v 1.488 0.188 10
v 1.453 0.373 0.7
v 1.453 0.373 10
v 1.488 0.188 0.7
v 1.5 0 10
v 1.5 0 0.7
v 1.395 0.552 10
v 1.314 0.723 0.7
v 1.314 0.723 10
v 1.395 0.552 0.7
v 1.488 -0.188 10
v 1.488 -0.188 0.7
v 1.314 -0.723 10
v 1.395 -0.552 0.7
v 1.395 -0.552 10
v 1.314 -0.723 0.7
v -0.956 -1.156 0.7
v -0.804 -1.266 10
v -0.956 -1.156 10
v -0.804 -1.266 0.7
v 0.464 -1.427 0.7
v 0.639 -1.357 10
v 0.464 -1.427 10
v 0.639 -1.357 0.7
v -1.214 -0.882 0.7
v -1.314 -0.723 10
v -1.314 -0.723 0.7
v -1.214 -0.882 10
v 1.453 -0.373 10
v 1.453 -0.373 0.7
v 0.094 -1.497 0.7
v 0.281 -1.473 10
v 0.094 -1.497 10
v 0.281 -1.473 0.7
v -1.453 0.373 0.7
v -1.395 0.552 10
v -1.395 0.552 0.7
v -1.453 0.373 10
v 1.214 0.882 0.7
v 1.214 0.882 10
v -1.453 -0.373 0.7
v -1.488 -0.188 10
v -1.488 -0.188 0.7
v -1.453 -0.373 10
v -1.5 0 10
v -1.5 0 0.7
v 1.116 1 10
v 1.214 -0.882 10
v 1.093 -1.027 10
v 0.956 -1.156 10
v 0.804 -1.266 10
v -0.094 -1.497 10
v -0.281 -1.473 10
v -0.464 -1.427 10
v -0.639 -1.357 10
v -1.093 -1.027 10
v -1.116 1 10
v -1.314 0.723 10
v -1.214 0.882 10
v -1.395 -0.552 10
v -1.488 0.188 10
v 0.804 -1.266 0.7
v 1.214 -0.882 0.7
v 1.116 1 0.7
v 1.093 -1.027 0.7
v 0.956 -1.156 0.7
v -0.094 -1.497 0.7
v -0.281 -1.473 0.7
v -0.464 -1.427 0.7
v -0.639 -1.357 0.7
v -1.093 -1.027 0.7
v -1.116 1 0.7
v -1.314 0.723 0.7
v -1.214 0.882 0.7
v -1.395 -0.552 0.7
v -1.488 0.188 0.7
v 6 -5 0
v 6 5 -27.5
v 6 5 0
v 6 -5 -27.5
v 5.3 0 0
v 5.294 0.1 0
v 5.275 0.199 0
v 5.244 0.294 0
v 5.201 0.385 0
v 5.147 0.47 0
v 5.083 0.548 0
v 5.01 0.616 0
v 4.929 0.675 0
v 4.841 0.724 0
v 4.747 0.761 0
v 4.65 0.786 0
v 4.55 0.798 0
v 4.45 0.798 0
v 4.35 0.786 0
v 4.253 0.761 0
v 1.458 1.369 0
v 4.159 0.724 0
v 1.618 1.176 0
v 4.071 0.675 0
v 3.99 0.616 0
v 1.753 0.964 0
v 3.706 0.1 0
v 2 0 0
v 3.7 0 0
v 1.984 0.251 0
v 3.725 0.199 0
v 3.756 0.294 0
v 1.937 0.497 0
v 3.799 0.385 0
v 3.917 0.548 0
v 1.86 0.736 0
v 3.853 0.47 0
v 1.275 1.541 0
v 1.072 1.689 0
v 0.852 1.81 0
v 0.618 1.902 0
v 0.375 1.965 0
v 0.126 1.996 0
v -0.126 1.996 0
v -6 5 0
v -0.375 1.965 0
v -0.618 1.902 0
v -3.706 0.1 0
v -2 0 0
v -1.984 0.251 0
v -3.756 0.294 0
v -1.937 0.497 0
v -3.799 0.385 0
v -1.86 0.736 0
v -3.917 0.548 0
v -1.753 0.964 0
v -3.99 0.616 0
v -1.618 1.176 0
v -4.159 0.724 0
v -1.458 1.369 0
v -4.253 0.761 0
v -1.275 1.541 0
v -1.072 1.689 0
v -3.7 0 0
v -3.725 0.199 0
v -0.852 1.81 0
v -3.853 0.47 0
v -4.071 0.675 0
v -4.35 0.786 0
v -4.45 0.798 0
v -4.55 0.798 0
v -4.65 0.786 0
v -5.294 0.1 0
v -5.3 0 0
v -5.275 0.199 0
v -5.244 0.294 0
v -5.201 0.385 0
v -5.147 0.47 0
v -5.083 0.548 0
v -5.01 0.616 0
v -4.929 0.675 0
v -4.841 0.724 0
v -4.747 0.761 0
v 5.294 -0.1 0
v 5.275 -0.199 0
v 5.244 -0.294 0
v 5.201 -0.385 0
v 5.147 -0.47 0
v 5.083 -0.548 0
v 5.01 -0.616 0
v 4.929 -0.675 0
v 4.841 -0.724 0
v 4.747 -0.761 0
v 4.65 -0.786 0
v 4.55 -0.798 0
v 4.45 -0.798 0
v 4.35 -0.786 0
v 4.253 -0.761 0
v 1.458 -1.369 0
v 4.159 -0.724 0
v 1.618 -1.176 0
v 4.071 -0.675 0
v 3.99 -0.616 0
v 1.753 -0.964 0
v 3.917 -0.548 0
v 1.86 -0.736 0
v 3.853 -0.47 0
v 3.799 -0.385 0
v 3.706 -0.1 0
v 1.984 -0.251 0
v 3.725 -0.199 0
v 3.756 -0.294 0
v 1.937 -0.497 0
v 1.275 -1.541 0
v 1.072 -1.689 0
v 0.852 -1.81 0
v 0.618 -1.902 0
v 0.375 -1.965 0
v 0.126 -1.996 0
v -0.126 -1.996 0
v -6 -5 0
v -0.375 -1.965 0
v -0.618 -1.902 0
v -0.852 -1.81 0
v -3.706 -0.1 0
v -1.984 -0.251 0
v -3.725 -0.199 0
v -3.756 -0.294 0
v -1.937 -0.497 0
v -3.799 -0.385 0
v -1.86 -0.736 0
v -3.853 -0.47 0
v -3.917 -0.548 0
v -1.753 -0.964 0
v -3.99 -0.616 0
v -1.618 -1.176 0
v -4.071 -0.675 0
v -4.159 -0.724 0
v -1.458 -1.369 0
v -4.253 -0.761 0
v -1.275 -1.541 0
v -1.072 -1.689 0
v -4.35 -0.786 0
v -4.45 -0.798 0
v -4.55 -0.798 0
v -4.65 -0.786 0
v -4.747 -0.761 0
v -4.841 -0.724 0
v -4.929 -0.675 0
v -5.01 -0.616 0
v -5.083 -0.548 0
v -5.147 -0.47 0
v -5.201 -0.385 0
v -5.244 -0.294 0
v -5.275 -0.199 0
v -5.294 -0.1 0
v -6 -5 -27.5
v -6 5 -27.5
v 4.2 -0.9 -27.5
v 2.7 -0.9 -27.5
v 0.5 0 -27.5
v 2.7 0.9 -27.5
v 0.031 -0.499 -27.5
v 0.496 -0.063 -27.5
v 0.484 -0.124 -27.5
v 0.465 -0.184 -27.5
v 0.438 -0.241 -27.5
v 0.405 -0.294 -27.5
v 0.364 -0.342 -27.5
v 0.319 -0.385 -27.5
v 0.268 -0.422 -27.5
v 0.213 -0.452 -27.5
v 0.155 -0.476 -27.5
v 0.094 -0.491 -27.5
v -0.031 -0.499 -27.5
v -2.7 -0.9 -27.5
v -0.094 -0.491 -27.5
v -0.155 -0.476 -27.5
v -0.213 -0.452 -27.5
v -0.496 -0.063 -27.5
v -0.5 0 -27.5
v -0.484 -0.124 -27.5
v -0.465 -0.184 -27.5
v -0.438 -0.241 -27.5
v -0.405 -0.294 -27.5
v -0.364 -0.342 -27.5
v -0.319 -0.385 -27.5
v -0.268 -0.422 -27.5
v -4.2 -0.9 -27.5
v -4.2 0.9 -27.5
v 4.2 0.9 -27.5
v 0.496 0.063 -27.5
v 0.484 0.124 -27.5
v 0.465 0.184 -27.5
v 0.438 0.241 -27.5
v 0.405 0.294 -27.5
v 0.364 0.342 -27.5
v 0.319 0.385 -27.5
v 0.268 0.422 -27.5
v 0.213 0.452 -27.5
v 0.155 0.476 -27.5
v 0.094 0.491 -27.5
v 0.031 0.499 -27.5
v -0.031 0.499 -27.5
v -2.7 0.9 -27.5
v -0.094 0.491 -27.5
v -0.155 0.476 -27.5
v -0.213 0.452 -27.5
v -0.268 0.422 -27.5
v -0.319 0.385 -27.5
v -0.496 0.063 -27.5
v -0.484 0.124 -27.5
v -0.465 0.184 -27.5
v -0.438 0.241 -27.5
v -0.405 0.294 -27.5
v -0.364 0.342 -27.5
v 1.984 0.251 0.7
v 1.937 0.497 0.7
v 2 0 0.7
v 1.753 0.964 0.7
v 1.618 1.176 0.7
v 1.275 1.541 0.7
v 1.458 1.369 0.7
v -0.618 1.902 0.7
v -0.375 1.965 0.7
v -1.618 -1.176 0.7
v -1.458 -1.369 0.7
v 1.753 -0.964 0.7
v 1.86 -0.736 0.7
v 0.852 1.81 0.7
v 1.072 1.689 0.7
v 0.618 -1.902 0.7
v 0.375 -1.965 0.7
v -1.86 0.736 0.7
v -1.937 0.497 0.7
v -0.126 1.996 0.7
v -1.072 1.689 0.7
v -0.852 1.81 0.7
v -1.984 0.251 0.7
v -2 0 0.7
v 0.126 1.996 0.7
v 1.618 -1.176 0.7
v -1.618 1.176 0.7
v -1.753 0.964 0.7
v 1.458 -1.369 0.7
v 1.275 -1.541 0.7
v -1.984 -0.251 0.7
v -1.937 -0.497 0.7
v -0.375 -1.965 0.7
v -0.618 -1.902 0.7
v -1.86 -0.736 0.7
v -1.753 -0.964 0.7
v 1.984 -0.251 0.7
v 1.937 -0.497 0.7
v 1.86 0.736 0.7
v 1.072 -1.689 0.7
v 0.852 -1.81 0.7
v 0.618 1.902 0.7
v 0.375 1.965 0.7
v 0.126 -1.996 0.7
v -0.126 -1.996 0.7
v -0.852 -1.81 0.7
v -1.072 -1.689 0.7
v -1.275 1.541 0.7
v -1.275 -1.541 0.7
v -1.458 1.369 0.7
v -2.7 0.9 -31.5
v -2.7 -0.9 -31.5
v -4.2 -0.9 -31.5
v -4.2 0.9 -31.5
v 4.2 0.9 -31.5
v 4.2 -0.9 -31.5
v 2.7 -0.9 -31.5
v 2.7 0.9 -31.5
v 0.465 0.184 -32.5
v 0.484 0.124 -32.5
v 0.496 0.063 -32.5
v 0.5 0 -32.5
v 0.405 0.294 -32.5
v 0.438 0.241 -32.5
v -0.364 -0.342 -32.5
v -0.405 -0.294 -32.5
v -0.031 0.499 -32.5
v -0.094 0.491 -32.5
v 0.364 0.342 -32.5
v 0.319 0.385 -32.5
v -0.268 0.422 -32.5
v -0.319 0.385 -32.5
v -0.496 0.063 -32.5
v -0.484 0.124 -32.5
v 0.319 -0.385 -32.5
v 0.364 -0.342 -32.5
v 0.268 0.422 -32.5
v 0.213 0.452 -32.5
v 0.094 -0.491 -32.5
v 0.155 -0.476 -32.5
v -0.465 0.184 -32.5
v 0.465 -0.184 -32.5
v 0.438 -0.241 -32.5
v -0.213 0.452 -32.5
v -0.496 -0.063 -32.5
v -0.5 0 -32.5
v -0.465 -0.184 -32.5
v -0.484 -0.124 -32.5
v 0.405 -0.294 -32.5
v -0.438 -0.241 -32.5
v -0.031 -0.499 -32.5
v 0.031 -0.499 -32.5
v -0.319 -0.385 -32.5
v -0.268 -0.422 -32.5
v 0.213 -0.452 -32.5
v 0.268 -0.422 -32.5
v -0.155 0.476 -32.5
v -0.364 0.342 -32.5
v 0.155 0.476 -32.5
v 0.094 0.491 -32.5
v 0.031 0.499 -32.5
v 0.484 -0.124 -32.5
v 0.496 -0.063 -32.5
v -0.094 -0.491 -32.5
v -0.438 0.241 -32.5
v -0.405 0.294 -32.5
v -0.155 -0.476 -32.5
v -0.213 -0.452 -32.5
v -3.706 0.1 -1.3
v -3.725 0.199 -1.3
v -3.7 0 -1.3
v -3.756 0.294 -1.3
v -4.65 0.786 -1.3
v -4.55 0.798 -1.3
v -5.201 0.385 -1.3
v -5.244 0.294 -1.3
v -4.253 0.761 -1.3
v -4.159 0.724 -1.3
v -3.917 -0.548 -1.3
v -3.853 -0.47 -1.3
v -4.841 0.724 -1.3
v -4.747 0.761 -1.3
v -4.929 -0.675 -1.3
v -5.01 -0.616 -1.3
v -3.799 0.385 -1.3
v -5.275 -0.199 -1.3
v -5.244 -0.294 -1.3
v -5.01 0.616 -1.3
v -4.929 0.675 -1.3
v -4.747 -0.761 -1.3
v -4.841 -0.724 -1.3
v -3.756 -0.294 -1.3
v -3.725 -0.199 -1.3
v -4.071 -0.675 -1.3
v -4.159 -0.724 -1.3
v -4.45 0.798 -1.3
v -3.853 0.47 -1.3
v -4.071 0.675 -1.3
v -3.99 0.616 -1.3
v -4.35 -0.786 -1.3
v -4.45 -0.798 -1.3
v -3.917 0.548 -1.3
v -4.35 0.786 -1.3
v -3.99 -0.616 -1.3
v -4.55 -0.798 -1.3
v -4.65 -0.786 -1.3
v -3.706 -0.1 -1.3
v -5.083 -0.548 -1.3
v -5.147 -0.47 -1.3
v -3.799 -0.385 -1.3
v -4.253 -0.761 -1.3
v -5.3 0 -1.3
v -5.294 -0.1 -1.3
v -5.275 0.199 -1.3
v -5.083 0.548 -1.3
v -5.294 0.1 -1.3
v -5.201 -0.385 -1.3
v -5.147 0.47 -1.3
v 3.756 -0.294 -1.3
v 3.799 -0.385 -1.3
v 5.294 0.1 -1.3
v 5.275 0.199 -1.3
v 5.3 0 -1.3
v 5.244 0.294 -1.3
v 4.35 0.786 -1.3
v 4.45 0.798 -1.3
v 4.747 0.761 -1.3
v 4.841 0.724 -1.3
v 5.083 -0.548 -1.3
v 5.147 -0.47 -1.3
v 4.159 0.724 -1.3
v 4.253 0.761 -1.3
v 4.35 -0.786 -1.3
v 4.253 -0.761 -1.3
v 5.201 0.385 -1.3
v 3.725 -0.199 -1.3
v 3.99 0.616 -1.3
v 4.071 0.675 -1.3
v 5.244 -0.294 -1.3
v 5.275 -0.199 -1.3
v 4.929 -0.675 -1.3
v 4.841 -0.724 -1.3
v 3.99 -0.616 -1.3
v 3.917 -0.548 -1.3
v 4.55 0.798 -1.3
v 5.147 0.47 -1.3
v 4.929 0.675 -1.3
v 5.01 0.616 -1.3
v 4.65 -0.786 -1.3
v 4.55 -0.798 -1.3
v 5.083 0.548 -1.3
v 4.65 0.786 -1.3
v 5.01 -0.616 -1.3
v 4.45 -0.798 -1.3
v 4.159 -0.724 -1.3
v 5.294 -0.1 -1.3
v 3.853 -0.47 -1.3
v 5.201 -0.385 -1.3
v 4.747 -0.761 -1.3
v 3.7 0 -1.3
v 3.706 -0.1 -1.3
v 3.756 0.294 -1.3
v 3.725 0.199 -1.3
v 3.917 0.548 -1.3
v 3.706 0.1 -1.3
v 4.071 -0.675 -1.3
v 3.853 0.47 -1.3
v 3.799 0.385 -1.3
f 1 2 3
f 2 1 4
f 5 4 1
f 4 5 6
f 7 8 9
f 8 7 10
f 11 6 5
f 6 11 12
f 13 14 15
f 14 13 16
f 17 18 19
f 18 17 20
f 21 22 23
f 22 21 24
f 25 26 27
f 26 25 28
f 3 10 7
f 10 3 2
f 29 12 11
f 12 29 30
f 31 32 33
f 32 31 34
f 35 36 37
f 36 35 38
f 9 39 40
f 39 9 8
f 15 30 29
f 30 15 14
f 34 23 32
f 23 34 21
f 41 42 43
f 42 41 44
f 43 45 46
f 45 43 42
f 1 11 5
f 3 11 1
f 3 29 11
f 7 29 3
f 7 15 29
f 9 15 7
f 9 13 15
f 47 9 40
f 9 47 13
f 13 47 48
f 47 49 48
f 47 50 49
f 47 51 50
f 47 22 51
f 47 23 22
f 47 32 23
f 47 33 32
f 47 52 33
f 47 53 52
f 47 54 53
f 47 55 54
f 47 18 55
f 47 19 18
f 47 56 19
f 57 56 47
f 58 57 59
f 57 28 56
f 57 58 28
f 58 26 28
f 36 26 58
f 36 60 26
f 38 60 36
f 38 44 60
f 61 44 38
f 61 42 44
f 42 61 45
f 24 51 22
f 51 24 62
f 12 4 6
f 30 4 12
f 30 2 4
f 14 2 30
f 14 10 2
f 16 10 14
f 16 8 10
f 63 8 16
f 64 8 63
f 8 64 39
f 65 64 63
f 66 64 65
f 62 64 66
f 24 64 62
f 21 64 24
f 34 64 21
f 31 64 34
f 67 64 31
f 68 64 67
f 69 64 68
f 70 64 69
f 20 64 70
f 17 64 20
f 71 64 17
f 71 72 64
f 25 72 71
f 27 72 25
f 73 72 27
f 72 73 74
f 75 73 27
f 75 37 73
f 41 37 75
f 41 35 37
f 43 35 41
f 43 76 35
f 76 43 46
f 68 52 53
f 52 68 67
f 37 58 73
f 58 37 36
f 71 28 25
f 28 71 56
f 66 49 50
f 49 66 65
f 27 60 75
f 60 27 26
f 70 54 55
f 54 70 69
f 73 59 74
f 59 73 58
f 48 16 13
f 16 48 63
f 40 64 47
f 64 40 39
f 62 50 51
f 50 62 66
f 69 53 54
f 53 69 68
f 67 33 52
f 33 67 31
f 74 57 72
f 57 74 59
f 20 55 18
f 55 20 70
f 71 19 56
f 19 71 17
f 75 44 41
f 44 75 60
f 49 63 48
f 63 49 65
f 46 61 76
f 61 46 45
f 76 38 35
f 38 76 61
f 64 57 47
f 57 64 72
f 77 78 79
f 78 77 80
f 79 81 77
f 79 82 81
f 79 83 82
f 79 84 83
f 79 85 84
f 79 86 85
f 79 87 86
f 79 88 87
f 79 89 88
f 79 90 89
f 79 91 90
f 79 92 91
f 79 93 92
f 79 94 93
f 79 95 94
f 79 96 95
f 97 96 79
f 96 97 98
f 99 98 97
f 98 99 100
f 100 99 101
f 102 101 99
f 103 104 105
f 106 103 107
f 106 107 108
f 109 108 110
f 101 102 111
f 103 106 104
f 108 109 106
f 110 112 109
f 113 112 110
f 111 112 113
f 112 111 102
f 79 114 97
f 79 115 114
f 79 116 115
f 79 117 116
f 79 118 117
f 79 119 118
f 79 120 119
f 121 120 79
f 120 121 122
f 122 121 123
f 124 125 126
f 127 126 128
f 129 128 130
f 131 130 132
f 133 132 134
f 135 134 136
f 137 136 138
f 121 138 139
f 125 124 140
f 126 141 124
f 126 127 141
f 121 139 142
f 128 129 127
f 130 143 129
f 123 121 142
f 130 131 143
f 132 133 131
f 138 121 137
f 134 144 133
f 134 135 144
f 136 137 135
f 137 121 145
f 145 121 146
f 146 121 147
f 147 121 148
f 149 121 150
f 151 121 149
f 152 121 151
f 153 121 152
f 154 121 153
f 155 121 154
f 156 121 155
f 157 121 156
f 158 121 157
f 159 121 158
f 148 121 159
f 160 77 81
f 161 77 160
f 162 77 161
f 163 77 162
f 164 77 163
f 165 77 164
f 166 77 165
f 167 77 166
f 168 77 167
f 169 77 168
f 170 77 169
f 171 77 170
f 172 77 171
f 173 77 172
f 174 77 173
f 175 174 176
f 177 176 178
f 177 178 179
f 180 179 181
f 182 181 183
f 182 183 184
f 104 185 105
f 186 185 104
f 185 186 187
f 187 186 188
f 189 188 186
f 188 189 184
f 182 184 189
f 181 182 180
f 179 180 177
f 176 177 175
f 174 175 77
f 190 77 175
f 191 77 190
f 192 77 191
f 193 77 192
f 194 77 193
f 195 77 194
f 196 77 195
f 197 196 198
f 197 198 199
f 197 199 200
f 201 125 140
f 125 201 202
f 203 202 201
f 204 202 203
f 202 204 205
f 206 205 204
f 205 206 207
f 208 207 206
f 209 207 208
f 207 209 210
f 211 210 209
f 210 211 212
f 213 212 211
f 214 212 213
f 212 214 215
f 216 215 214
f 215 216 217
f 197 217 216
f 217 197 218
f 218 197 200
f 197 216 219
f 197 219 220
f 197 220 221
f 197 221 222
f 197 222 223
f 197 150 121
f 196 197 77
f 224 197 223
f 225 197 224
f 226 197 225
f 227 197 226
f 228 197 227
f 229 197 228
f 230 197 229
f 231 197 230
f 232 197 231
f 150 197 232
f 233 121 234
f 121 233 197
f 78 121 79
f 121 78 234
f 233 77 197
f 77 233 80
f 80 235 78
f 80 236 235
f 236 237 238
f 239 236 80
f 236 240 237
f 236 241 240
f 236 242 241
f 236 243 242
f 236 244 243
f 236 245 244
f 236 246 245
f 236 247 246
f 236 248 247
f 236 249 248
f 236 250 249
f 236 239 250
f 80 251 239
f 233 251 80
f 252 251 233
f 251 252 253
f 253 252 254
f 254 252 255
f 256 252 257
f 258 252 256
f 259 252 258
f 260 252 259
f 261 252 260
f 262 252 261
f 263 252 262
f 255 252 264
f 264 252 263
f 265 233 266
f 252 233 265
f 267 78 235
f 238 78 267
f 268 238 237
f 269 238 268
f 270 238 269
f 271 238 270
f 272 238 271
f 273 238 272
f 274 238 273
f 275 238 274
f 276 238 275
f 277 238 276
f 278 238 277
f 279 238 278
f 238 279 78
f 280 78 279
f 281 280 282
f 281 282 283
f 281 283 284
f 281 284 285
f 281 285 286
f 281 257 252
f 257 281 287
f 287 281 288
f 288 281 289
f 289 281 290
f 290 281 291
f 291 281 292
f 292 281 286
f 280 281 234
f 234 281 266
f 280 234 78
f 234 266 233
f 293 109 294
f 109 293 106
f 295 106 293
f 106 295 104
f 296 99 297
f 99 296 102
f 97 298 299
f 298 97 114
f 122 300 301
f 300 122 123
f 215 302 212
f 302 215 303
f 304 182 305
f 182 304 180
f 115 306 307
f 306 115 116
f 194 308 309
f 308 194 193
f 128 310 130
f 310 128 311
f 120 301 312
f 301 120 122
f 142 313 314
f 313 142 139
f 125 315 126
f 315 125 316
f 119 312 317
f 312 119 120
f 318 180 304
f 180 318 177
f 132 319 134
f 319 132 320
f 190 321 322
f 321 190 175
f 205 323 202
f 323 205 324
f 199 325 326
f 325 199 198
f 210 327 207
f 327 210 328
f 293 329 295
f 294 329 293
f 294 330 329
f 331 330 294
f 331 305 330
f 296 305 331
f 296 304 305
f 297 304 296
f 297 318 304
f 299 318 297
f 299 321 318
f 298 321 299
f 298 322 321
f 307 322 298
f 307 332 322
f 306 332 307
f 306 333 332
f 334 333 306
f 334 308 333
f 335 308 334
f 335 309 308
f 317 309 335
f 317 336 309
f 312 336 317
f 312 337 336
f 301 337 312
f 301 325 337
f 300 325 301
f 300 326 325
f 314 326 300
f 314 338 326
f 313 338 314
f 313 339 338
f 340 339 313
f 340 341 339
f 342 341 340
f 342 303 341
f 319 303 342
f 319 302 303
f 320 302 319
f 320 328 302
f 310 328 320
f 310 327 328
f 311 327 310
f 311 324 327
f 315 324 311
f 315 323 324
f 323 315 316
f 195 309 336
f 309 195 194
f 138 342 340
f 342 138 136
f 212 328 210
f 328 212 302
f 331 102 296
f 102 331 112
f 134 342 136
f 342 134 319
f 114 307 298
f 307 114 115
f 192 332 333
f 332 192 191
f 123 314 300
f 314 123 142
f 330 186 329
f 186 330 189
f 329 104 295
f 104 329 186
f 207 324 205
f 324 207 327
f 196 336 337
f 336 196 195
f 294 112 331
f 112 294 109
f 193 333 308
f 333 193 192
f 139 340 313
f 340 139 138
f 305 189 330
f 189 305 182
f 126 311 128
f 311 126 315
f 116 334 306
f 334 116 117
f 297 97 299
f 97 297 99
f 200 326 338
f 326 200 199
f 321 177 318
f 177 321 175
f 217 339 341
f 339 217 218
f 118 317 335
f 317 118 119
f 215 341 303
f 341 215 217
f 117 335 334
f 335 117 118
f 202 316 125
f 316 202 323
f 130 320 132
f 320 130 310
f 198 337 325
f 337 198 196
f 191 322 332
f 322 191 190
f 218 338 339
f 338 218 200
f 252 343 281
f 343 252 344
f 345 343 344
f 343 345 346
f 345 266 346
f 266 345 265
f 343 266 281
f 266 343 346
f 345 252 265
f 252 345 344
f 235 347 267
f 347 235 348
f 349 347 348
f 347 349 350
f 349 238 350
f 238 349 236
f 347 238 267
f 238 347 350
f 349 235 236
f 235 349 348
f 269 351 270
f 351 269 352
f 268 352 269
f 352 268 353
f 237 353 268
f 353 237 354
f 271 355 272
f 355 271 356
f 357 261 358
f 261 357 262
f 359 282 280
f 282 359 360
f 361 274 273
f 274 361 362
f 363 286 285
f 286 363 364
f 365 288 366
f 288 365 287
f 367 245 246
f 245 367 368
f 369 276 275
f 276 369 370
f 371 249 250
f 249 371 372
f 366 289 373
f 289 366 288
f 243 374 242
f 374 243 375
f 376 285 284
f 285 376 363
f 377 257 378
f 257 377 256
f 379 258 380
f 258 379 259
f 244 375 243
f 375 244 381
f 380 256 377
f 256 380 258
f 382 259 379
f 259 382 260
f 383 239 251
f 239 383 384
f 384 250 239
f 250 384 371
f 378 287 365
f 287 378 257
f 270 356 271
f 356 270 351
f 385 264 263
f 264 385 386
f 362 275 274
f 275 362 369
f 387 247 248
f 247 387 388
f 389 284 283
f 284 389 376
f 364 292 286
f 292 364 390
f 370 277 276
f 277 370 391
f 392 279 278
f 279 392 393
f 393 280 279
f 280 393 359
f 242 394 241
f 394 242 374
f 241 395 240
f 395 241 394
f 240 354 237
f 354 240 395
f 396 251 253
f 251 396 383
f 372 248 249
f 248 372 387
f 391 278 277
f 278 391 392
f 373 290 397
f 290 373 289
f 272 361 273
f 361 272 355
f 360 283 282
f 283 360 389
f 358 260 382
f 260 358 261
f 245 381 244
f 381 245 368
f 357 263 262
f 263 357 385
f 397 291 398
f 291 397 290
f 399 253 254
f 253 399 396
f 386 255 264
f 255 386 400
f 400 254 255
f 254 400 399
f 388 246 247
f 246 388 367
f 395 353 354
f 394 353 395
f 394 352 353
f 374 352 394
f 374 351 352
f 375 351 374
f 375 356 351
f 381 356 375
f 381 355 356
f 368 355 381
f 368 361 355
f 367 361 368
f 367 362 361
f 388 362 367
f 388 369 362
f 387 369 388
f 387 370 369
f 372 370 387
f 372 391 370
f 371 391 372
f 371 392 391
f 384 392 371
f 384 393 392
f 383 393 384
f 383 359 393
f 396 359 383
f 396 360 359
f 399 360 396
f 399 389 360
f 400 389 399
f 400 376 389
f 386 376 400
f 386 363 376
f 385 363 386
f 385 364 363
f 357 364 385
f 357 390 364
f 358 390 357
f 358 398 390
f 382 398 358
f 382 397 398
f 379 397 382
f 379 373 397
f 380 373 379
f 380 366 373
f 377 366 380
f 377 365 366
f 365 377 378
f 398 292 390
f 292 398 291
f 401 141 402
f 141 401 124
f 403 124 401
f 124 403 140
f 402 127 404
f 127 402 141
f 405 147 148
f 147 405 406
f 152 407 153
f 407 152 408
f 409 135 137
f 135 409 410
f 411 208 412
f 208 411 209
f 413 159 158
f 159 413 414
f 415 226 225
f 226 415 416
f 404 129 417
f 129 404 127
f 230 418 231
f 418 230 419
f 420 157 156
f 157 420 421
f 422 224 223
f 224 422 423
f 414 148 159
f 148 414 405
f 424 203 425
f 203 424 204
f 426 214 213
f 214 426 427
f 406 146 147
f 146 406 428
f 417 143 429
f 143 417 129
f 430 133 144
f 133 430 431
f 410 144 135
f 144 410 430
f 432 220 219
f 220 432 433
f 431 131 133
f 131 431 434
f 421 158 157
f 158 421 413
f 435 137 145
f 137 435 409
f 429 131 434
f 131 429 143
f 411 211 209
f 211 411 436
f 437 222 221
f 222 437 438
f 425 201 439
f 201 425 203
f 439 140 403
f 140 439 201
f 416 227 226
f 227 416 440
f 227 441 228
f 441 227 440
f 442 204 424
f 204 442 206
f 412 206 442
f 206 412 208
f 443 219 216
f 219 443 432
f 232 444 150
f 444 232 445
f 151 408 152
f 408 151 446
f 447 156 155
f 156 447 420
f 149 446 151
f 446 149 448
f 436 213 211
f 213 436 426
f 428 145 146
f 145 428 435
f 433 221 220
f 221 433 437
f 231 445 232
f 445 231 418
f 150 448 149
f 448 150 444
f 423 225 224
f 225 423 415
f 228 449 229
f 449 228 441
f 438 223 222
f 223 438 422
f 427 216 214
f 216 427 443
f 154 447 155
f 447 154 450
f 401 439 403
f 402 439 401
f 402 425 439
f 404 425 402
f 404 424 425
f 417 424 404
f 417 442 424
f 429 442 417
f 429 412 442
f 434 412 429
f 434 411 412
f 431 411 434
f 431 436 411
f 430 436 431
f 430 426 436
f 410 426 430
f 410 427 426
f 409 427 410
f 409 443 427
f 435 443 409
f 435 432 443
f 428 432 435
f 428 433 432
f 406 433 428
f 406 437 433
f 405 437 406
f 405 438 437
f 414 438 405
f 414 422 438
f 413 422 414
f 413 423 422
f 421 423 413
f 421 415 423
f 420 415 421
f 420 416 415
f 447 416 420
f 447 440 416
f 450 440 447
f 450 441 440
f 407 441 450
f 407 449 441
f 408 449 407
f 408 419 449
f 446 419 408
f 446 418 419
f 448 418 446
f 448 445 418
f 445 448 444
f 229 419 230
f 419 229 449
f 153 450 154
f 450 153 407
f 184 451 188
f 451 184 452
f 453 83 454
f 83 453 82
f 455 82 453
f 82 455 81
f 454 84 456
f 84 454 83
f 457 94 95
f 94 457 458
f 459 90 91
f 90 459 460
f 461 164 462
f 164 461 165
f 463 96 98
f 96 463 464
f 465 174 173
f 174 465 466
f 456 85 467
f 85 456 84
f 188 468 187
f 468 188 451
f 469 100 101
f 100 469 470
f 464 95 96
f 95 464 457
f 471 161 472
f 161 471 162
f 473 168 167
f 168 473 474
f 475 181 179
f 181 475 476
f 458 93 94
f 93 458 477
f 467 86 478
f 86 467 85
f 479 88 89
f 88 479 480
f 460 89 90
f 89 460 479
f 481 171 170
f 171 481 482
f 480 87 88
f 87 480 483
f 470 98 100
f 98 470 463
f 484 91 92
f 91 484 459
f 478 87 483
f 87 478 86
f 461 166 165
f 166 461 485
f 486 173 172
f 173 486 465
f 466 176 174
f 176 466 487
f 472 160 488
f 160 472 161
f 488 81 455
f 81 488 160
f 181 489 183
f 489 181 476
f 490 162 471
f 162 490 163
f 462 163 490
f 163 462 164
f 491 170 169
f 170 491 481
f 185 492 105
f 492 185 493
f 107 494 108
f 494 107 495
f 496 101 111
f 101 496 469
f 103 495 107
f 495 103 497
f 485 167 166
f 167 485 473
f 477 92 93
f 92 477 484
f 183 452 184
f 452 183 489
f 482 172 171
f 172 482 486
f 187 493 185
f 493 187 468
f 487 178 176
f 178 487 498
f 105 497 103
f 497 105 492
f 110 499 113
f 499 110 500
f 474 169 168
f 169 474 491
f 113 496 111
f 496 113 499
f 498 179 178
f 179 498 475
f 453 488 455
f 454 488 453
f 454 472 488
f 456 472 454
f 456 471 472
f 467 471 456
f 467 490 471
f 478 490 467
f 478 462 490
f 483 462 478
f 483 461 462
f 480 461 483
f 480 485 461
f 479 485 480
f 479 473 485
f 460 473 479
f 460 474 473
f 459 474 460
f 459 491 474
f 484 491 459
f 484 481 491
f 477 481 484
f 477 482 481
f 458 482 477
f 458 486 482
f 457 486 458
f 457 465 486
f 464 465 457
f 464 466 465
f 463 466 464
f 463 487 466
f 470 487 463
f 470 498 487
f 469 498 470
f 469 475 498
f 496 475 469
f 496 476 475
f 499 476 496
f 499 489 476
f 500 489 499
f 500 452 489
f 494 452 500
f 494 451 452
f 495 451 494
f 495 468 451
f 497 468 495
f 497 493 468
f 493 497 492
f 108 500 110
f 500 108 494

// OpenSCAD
$fn = 50;

difference() {
	union() {
		translate(v = [0, 0, 0.7]) {
			rotate(a = [0, 0, 0]) {
				difference() {
					union() {
						cylinder(h = 9.3, r = 1.5);
					}
					union() {
						translate(v = [-6.0, 1.0, -1]) {
							cube(size = [12, 12, 11.3]);
						}
					}
				}
			}
		}
		translate(v = [-6.0, -5.0, -9]) {
			cube(size = [12, 10, 9]);
		}
		translate(v = [-6.0, -5.0, -27.5]) {
			cube(size = [12, 10, 18.5]);
		}
		cylinder(h = 0.7, r = 2.0);
		translate(v = [-4.2, -0.9, -31.5]) {
			cube(size = [1.5, 1.8, 4]);
		}
		translate(v = [2.7, -0.9, -31.5]) {
			cube(size = [1.5, 1.8, 4]);
		}
		translate(v = [0, 0, -32.5]) {
			cylinder(h = 5, r = 0.5);
		}
	}
	union() {
		translate(v = [-4.5, 0, -1.3]) {
			cylinder(h = 1.31, r = 0.8);
		}
		translate(v = [4.5, 0, -1.3]) {
			cylinder(h = 1.31, r = 0.8);
		}
	}
}
